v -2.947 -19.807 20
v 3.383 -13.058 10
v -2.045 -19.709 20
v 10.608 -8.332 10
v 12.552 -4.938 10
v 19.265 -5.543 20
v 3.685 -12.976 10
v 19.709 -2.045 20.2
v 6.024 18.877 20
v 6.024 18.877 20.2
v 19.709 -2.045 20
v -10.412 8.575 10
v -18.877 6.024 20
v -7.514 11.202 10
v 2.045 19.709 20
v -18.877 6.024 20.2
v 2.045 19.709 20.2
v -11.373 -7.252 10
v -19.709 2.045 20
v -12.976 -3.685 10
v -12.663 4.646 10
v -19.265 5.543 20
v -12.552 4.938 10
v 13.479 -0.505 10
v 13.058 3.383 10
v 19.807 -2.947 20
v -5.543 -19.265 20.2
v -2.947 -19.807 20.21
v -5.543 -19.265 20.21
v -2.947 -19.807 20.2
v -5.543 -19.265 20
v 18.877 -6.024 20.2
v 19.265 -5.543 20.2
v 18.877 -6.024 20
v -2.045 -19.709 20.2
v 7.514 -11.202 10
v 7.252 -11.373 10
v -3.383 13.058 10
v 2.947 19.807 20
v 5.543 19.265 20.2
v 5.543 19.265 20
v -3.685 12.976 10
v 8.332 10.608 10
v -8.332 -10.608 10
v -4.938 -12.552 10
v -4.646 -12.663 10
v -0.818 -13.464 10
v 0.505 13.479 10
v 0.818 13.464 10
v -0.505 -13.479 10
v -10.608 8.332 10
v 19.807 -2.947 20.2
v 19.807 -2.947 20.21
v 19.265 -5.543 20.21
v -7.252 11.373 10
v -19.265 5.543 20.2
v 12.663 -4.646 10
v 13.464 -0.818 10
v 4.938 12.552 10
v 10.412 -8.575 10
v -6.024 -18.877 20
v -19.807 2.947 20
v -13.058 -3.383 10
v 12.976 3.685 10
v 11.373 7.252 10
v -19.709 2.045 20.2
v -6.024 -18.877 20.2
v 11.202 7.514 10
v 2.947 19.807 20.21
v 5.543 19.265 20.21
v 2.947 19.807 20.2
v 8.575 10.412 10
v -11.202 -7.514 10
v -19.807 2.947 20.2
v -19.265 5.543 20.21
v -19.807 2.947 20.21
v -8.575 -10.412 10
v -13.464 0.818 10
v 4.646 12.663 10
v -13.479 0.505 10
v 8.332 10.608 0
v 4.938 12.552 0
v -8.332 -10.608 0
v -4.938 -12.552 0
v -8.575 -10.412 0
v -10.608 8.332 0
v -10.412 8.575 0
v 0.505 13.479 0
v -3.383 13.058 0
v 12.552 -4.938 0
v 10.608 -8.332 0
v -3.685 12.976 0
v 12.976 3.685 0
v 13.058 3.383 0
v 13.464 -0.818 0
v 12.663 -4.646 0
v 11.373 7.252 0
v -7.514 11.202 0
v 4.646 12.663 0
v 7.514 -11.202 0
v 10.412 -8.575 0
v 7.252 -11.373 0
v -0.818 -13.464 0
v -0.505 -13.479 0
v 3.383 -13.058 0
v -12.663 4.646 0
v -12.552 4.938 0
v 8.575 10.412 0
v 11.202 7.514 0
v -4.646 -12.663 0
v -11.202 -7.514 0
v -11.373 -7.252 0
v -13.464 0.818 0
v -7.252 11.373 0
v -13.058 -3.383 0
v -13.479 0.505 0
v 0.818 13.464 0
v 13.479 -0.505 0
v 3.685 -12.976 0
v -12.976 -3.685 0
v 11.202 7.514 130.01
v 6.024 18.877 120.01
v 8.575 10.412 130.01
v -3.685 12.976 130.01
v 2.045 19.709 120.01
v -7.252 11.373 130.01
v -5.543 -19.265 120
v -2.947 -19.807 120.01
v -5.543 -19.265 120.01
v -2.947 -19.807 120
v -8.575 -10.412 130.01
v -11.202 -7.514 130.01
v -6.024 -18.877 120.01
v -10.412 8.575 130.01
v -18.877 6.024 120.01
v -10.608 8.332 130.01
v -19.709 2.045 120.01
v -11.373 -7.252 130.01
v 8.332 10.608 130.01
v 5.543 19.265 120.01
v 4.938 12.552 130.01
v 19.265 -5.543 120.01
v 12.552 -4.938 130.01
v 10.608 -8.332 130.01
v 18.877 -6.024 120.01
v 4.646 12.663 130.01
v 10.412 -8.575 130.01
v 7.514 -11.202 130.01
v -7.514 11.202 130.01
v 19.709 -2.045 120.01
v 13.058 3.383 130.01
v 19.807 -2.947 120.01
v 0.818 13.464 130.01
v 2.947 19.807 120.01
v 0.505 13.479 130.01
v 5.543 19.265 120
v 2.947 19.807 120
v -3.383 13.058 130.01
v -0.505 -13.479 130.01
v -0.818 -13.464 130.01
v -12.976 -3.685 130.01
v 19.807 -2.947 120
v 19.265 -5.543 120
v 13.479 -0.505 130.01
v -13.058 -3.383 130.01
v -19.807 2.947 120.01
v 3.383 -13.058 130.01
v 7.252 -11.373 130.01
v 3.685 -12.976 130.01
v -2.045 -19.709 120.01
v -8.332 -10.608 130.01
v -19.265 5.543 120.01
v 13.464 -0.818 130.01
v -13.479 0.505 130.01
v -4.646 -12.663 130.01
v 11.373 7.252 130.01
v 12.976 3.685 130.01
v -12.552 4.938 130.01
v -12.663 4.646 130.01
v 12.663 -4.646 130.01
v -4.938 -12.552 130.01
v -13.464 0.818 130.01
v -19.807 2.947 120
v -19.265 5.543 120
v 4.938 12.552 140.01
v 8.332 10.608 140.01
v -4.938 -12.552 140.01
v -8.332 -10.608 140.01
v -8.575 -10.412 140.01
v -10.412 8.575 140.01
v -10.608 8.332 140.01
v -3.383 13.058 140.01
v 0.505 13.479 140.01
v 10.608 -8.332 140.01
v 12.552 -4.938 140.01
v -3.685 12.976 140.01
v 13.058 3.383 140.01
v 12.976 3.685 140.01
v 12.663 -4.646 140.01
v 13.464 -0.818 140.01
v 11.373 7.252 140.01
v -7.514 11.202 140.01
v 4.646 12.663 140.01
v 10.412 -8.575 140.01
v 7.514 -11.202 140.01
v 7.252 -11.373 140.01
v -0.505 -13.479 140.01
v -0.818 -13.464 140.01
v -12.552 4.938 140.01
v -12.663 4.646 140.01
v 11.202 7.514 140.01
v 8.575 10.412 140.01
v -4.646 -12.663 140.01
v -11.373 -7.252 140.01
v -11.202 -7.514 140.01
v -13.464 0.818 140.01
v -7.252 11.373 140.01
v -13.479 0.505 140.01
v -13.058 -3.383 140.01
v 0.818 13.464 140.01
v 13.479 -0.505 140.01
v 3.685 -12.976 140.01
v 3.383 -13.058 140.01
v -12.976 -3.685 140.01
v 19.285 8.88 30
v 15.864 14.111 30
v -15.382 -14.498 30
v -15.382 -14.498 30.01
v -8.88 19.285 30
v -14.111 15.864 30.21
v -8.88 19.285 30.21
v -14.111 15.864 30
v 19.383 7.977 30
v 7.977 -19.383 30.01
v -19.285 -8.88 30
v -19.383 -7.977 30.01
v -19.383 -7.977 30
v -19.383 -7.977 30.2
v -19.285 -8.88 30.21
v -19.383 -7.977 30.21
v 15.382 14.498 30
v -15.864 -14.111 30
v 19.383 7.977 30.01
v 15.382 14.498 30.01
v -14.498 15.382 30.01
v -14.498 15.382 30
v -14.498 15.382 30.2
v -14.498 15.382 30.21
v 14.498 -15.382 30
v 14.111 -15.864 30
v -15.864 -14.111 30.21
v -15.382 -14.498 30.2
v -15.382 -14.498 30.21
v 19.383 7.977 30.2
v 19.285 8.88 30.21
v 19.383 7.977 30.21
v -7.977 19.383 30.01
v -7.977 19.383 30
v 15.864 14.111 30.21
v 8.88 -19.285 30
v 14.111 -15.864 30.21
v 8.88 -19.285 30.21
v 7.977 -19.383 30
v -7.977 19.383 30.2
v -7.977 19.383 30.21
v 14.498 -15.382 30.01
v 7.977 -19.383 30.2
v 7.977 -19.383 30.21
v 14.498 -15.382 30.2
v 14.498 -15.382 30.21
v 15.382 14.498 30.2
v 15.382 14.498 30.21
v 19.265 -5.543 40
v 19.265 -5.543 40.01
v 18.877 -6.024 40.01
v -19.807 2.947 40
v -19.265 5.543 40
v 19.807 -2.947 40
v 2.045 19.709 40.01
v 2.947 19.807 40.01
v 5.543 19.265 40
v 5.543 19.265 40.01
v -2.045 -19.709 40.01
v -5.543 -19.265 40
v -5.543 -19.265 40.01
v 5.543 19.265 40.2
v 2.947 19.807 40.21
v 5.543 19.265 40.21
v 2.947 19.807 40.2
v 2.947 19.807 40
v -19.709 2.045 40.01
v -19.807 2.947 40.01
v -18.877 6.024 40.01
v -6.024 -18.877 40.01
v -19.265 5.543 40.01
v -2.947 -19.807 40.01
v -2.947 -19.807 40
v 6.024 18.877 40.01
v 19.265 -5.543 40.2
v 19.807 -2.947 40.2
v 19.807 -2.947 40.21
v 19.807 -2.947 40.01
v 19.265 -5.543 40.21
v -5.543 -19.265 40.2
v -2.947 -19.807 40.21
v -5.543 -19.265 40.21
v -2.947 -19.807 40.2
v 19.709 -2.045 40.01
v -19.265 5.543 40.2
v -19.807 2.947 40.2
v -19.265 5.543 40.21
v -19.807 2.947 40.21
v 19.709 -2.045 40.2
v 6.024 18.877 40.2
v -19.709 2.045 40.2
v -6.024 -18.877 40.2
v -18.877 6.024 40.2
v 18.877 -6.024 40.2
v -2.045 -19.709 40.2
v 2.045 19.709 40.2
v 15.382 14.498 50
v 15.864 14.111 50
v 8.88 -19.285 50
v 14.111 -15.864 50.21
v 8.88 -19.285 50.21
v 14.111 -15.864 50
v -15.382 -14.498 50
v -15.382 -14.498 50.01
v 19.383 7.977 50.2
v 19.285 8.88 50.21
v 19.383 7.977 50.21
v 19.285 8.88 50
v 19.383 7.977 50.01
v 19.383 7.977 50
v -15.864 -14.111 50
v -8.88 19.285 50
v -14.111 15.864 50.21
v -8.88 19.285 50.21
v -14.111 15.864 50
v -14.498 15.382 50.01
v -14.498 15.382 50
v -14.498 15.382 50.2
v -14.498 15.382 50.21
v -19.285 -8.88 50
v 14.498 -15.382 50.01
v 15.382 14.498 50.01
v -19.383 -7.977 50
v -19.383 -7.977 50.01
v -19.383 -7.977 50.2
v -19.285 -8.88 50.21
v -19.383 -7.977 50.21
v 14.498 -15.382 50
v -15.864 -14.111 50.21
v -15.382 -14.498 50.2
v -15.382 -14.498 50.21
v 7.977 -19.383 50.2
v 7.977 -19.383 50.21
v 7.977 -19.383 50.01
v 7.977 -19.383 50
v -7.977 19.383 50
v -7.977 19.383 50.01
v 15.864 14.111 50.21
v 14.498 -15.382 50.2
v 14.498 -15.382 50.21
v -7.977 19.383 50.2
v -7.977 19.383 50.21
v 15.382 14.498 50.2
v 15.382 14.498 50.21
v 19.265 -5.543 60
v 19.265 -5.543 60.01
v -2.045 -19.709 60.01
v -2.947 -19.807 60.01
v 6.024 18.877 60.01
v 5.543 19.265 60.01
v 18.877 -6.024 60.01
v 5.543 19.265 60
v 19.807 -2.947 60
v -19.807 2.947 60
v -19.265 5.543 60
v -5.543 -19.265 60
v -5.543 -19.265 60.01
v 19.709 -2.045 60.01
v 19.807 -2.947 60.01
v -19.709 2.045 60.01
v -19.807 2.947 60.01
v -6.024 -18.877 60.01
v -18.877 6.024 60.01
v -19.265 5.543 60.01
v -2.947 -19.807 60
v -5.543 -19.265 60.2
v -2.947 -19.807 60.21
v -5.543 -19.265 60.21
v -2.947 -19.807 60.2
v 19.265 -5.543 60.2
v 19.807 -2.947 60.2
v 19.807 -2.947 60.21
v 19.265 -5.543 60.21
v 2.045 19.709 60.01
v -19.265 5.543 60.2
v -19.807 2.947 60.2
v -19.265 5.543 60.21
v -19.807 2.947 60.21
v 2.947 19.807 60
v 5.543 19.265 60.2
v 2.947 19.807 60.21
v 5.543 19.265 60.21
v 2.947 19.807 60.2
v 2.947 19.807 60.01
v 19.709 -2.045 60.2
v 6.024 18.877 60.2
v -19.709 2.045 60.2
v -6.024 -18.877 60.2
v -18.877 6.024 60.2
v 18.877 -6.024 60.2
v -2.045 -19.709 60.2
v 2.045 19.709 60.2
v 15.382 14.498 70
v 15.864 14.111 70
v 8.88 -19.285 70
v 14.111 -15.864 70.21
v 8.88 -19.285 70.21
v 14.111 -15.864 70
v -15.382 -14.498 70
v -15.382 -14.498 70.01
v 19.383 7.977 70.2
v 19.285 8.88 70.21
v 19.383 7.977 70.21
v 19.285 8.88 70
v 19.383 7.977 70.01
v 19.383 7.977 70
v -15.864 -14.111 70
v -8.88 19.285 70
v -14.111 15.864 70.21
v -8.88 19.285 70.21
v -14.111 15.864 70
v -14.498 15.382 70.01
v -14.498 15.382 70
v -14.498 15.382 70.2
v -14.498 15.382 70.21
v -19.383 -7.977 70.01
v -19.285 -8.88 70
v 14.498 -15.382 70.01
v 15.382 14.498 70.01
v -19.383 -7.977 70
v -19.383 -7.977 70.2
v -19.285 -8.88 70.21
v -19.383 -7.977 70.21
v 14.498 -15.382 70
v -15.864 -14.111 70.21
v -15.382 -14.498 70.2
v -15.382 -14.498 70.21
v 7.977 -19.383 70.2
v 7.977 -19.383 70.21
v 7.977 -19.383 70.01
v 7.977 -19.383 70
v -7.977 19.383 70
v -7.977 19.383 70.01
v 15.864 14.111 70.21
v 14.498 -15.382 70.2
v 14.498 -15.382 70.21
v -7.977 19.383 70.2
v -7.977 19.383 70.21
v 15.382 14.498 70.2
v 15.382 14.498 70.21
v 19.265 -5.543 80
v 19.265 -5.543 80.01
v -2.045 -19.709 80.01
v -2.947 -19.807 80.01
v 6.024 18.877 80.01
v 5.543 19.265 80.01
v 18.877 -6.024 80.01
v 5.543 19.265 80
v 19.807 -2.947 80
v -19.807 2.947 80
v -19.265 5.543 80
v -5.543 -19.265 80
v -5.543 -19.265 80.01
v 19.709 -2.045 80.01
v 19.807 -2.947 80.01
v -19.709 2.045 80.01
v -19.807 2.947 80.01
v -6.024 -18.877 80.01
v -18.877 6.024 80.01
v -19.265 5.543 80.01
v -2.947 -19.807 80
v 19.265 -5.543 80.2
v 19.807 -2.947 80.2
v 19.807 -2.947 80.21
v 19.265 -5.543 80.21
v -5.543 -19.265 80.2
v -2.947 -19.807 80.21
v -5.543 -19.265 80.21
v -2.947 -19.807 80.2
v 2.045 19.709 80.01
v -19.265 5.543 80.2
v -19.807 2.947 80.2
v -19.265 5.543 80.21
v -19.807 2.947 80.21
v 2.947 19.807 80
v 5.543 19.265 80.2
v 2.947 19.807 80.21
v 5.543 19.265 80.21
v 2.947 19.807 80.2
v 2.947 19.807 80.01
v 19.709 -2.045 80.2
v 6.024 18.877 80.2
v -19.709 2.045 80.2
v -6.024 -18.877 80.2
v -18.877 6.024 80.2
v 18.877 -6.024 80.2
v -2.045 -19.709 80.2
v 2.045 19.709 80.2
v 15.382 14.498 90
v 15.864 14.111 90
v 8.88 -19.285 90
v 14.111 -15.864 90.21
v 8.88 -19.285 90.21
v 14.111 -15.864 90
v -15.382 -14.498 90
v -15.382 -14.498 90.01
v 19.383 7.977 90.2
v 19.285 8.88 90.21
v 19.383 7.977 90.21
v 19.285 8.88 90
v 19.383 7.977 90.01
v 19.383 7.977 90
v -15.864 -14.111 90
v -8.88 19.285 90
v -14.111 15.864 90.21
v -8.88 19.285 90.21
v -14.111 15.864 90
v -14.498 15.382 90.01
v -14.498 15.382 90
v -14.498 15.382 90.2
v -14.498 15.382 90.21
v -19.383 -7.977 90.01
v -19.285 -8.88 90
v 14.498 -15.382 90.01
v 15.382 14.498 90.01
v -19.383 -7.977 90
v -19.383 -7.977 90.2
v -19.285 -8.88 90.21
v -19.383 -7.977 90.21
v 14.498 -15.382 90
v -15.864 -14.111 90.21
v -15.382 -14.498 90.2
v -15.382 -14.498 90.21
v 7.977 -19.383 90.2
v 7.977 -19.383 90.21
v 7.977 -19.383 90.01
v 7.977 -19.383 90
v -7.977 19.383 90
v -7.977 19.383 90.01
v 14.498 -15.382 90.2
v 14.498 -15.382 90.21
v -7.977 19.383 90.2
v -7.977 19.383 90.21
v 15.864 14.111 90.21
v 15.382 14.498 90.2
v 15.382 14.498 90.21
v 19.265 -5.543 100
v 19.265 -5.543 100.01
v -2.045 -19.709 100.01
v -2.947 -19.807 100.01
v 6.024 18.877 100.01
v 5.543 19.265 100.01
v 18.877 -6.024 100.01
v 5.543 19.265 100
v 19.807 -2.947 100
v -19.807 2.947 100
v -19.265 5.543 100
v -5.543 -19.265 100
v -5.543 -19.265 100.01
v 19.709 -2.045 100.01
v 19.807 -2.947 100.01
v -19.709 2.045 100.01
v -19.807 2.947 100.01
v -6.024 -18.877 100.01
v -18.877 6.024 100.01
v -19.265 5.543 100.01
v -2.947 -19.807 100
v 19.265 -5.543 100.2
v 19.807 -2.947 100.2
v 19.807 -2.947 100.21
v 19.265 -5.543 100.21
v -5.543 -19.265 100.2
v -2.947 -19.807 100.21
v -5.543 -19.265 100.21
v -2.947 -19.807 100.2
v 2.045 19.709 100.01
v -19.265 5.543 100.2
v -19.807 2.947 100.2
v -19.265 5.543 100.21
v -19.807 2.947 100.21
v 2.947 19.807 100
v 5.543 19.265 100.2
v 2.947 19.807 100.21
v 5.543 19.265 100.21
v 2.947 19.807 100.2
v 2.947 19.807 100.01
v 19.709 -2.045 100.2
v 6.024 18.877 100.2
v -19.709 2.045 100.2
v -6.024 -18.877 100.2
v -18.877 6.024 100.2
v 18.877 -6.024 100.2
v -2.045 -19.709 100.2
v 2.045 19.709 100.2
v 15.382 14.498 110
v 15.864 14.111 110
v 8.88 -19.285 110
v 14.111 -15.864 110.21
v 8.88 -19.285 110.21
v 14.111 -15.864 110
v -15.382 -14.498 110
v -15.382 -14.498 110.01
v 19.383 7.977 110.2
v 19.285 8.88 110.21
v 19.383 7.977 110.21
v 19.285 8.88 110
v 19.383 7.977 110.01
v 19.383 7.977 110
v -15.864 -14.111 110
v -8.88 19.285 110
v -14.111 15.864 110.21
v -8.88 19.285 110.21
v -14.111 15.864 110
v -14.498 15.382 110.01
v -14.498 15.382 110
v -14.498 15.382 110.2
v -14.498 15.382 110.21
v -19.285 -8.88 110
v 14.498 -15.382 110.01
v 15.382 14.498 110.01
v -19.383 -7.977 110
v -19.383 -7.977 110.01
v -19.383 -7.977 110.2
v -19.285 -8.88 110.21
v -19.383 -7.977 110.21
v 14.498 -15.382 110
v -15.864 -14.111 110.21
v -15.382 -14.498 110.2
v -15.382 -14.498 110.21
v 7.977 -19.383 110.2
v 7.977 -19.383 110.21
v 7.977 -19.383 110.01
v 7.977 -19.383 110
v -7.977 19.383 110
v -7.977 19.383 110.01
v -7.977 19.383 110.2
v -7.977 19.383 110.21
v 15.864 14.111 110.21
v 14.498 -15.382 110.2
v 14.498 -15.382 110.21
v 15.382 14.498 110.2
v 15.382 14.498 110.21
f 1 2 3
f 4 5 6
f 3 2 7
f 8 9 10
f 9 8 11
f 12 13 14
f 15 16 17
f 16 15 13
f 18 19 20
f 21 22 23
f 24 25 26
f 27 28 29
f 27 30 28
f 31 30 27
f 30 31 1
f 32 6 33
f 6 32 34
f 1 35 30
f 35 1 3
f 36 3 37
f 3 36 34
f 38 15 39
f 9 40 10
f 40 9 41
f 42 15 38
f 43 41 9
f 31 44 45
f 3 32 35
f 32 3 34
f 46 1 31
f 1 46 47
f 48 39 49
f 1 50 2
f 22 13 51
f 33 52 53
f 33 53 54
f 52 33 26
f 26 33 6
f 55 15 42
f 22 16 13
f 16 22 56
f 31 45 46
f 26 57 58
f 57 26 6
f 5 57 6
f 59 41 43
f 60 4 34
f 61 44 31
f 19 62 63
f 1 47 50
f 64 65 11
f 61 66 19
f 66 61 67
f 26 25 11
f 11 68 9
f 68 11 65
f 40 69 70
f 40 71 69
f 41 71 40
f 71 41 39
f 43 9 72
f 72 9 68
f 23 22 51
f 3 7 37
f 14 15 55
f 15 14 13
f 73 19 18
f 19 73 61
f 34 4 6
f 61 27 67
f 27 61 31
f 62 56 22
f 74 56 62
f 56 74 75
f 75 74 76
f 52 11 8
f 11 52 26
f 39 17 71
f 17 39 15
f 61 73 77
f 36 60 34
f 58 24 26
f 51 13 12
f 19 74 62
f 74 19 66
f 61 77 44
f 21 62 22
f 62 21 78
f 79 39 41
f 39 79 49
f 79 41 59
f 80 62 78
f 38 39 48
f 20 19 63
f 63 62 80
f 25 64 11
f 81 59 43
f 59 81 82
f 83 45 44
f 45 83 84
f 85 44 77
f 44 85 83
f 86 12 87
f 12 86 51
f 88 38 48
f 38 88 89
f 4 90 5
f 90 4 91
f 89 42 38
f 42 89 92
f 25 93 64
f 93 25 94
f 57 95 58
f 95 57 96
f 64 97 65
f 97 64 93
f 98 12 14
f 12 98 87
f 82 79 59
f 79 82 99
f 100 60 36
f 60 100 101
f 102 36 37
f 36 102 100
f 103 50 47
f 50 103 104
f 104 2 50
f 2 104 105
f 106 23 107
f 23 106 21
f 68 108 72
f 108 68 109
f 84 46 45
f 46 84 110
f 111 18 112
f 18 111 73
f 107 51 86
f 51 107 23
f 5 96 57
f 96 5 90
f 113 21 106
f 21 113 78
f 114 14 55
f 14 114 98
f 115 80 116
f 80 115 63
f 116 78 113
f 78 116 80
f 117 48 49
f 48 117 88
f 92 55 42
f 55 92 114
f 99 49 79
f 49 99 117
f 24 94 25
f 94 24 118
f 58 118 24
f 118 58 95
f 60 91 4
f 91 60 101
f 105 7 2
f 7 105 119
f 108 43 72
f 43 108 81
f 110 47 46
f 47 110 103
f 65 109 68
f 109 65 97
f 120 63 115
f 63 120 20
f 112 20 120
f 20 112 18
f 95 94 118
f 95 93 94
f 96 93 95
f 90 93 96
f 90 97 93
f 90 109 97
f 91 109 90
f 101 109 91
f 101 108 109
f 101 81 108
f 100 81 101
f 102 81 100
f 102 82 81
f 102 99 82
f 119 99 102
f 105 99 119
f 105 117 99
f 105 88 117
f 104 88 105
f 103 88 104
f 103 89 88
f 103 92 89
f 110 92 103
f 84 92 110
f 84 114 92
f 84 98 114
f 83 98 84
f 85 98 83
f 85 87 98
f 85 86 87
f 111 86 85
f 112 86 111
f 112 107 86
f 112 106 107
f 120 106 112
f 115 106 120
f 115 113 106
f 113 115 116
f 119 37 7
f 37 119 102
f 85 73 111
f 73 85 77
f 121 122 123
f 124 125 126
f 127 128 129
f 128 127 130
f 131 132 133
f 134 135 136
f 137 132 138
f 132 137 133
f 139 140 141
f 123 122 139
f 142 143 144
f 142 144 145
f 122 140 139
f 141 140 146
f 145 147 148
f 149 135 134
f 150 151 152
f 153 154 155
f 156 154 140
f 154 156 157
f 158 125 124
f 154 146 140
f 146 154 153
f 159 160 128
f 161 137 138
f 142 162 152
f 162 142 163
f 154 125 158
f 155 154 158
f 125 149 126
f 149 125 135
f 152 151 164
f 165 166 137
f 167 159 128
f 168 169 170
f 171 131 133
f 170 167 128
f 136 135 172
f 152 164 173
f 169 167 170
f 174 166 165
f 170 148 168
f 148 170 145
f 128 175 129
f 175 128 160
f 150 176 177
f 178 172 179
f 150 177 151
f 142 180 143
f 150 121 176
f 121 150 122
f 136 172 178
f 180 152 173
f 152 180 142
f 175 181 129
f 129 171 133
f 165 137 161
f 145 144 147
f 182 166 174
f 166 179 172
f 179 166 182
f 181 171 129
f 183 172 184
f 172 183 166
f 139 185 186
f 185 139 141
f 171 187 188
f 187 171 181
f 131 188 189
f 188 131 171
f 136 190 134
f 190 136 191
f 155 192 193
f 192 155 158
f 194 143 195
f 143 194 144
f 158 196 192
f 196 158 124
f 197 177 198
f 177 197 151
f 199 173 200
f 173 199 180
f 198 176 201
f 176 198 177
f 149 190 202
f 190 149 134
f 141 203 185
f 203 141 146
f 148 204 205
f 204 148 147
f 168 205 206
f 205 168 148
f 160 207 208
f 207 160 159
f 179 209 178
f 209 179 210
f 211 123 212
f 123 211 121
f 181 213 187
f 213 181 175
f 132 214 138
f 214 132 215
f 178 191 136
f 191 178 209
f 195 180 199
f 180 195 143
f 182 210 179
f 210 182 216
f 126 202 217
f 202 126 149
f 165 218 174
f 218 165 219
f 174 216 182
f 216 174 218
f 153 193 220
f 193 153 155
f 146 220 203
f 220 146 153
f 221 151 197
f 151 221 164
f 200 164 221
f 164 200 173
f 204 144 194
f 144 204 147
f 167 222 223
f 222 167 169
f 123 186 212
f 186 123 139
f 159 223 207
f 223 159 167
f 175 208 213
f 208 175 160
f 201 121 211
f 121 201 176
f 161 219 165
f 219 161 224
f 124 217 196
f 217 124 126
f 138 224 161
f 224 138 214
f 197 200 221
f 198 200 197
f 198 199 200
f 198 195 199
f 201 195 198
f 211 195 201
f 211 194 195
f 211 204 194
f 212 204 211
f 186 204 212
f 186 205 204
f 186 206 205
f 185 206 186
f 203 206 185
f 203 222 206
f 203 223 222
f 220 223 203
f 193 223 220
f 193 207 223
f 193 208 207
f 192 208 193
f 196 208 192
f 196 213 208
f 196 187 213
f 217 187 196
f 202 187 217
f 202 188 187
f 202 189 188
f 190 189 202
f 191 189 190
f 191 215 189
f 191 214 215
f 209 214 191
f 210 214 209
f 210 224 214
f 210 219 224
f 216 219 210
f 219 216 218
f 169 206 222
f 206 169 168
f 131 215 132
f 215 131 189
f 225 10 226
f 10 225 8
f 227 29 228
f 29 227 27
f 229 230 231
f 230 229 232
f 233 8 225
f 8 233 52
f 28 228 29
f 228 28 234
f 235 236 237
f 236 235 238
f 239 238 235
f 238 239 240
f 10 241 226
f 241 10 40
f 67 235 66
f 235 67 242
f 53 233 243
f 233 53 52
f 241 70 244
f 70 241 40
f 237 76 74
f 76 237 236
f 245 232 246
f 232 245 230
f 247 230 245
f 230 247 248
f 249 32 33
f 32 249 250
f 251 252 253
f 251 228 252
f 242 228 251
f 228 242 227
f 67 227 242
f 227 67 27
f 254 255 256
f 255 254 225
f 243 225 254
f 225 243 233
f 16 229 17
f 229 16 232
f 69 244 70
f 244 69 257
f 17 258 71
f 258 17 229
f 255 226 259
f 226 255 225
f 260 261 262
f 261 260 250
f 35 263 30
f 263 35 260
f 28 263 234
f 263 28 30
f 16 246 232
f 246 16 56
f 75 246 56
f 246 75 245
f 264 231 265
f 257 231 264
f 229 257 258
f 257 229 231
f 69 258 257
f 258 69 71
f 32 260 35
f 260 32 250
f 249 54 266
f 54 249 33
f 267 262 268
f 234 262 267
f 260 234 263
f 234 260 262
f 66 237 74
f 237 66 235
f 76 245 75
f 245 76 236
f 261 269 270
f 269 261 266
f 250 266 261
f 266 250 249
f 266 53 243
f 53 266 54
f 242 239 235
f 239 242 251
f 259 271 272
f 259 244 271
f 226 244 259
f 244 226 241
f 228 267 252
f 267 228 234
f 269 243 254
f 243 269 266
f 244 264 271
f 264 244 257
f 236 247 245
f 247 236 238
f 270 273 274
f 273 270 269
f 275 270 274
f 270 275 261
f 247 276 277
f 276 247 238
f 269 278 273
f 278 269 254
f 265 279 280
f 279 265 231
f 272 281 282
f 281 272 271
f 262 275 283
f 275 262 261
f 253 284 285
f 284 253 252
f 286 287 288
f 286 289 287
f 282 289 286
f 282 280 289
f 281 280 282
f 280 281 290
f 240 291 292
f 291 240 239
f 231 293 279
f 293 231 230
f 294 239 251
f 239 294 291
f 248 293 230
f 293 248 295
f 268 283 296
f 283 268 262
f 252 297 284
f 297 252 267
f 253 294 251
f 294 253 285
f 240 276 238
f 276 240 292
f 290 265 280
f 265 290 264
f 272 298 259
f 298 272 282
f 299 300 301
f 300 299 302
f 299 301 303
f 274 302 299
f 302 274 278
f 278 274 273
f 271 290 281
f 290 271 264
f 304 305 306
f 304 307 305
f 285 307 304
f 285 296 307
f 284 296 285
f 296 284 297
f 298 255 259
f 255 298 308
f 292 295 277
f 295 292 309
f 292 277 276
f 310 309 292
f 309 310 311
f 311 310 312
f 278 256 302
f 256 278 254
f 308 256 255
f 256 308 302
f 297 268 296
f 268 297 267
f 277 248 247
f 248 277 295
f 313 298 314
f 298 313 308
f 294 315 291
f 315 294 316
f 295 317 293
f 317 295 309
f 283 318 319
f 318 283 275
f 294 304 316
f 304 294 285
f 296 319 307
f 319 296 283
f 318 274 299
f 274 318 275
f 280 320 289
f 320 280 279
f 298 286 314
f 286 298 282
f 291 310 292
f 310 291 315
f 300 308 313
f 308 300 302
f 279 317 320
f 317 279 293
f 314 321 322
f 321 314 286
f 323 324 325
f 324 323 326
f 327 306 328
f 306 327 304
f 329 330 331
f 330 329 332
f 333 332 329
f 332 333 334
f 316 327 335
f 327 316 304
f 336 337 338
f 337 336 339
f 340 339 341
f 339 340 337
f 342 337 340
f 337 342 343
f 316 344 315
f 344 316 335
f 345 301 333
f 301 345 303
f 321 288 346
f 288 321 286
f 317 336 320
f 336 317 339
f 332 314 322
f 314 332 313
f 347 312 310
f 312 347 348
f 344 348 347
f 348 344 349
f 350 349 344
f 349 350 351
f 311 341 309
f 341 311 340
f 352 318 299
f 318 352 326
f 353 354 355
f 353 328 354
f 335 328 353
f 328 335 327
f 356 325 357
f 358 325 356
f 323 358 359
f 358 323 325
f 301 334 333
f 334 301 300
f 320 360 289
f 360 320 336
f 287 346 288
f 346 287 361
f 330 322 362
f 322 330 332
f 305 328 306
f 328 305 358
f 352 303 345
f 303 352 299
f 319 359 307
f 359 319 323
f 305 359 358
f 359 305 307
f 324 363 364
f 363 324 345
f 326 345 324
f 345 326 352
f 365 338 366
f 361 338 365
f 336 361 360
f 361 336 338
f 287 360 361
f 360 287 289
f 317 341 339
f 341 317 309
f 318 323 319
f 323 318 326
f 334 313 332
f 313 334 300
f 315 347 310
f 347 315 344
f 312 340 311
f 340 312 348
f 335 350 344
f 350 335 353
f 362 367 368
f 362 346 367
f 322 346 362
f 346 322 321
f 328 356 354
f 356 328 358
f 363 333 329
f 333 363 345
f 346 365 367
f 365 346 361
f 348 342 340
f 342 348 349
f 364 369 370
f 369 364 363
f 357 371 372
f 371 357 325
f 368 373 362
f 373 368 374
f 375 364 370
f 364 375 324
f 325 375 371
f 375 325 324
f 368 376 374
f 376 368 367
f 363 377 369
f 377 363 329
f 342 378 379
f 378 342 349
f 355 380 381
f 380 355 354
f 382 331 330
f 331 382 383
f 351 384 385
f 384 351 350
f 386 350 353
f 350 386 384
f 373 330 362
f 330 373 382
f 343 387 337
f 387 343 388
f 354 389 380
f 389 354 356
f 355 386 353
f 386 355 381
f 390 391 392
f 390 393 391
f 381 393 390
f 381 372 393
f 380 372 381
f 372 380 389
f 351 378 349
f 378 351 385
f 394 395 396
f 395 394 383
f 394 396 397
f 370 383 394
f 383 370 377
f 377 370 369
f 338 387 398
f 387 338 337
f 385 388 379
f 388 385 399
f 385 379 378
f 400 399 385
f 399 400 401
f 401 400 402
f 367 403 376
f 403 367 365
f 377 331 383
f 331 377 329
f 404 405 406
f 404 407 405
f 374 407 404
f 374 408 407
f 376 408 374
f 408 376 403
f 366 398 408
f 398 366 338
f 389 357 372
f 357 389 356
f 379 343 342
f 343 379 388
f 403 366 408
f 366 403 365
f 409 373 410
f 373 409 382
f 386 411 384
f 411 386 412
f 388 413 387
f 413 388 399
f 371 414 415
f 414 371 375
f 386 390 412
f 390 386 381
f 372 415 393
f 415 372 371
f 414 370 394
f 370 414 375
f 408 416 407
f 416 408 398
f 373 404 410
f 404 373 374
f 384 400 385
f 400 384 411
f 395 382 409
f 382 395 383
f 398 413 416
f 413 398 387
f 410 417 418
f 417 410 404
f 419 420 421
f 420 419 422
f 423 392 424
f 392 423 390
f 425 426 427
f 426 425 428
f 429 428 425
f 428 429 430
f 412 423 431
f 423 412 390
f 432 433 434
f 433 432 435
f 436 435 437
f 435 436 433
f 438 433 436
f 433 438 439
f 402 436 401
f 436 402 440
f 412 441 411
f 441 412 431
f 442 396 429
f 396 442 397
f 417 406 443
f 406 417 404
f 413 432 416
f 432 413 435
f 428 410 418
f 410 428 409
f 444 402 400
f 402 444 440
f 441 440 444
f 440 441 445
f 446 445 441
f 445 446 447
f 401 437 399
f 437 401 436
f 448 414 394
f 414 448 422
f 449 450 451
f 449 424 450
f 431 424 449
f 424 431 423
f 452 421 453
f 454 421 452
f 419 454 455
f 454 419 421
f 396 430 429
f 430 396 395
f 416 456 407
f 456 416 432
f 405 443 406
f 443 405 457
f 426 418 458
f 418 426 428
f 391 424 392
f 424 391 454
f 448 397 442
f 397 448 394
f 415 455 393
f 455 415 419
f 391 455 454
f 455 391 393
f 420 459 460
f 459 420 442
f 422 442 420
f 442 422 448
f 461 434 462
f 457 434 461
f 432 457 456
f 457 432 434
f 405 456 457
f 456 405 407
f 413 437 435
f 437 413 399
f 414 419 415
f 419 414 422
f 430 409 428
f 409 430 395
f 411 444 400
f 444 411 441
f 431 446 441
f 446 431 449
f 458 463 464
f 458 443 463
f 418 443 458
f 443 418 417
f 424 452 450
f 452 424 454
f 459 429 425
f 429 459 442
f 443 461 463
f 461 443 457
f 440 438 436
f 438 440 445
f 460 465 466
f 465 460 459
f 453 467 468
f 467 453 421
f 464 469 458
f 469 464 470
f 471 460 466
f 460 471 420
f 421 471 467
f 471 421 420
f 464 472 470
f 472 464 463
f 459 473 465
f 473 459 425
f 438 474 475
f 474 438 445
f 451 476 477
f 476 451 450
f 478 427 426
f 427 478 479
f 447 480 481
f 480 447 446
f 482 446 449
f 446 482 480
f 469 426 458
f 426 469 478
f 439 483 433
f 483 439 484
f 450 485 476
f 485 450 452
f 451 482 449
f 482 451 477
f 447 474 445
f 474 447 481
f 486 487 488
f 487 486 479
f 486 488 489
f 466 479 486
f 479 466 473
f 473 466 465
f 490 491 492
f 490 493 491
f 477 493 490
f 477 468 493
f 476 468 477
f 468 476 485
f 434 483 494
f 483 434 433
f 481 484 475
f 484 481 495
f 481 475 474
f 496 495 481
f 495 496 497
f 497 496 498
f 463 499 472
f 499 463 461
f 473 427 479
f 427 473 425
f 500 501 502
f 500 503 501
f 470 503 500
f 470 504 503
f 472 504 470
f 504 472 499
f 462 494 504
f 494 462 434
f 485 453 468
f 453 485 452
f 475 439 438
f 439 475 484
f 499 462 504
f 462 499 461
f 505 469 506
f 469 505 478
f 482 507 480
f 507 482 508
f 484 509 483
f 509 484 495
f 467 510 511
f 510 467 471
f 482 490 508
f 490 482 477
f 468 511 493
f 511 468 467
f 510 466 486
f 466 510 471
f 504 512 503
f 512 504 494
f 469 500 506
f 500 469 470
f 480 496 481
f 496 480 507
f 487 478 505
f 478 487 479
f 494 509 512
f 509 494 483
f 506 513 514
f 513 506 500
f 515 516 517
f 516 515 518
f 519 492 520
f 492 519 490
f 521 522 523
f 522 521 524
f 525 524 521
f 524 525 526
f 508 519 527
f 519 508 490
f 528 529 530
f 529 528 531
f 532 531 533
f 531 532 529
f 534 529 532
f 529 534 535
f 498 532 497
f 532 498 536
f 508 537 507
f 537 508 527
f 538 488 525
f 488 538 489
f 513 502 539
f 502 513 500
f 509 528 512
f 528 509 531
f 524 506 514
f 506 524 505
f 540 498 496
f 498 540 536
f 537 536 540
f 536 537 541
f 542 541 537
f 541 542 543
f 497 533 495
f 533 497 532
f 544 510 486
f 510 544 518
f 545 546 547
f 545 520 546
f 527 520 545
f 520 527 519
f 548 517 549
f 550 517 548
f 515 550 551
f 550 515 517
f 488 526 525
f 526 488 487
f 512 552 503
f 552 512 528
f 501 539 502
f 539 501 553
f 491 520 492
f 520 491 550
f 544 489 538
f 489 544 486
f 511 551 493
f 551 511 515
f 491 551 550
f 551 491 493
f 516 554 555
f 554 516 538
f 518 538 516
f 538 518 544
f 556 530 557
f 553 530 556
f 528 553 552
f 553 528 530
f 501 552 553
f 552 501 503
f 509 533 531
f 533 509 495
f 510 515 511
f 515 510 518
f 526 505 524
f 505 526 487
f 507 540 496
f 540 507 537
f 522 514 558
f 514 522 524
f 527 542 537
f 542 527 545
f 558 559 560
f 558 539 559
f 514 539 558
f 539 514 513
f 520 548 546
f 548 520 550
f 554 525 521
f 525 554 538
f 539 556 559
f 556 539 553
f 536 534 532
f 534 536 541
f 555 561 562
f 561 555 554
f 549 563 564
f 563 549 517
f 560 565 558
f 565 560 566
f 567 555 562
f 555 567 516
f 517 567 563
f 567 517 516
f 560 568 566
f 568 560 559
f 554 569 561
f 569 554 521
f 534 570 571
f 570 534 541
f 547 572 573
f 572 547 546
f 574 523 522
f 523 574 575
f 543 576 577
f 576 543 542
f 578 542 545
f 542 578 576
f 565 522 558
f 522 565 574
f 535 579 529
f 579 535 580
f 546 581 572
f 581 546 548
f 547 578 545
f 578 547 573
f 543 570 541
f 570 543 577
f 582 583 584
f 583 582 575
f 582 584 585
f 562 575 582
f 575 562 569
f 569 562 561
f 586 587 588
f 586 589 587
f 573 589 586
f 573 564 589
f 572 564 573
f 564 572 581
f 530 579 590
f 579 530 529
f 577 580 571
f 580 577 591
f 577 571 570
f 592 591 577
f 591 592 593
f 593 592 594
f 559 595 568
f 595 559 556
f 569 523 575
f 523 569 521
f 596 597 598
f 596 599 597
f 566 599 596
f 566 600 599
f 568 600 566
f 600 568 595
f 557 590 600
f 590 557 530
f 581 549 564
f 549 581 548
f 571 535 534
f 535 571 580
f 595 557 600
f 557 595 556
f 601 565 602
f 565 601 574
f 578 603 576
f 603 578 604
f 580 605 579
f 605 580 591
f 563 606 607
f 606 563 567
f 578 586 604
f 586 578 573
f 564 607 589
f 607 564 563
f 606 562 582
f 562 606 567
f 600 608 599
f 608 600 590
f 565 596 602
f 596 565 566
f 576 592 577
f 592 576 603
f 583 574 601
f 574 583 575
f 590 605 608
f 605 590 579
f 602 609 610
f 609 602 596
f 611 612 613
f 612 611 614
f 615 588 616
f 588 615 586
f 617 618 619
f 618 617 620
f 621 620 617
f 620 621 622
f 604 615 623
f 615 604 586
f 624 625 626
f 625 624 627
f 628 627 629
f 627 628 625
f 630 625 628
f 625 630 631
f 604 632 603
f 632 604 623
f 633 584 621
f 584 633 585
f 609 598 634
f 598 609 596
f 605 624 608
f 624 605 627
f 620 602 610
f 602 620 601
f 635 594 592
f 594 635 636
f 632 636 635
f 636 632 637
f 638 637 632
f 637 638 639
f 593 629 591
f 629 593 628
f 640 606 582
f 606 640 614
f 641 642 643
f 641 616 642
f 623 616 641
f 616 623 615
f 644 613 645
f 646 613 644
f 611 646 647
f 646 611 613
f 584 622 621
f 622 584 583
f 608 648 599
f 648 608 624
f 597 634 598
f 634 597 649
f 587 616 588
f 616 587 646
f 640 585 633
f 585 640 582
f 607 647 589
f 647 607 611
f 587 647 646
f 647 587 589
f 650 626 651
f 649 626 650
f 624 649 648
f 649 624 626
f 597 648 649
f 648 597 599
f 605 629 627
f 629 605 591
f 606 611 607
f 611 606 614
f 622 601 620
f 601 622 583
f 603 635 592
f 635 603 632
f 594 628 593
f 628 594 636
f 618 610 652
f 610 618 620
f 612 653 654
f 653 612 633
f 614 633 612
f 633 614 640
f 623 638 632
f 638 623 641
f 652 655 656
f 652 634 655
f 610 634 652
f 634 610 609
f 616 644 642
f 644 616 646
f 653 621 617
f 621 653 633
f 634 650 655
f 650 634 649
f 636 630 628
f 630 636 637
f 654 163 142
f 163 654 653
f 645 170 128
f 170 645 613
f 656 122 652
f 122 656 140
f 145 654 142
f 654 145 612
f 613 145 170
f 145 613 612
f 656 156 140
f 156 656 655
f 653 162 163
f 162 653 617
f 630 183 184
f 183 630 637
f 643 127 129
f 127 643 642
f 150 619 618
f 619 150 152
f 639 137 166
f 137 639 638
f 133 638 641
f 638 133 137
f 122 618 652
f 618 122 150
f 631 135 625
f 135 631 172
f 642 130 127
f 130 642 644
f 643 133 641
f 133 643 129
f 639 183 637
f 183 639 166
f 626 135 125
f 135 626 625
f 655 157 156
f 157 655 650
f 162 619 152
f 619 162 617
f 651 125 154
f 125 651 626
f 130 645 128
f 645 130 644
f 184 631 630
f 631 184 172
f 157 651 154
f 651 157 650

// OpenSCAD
x = 25;
y = 25;
approx_z = 100;
steps = 10;
step = round(approx_z  / steps);
z=step*steps;
step2 = floor(step * 2);
ext = 1.5;
radi = 1;
verticalsegment = 0.2;
sleeve = 20;
sleeve_ext = 0;
sleeveext = sleeve*sleeve_ext;
sleeveFN = 20;

hx=x/2;
hy=y/2;
rotate([0,0,rnd(360)]){
sleeves();
body();
}
echo (ext);
module sleeves() {
  hull() {
    translate([0, 0, verticalsegment+  sleeve]) plane(x, y, 0);
    translate([0, 0,   sleeve]) plane(x, y, 0);
    translate([0, 0, sleeve- min(step,sleeve*0.5)]) sleeve(x, y);
  }
  hull() {
    translate([0, 0, sleeve- min(step,sleeve*0.5)]) sleeve(x, y);
    translate([0, 0, 0]) sleeve(x, y);
  }

  hull() {
    translate([0, 0, sleeve]) plane(x, y, z);
    translate([0, 0, z + sleeve + min(step,sleeve*0.5)]) sleeve(x, y);
  }
  hull() {
    translate([0, 0, z + sleeve + sleeve]) sleeve(x, y);
    translate([0, 0, z + sleeve + min(step,sleeve*0.5)]) sleeve(x, y);
  }
}
module body() {
  for (i = [0: step: z - step]) {
    hull() {
      translate([0, 0, verticalsegment + sleeve]) plane(x, y, i);
      translate([0, 0, sleeve]) plane(x, y, i);
    }
    hull() {
      translate([0, 0, verticalsegment + sleeve]) plane(x, y, i);
      translate([0, 0, sleeve]) plane(x, y, i + step);
    }
  }
}
module plane(x, y, z) {
  translate([0, 0, z]) linear_extrude(0.01) offset(r = radi, $fn = 10){
 square([x -hx * ext + ext*((z +step ) % step2) * ext, y + ((z  ) % step2) * ext], center = true);
 square([x + ((z ) % step2) * ext, y   -hy*ext+ ext*((z +step ) % step2) * ext ], center = true);
}
}
module sleeve(x, y) {
  translate([0, 0, 0]) linear_extrude(0.01) offset(r = radi, $fn = 10) scale([x + sleeveext * 2, y + sleeveext * 2])circle(0.5,$fn=sleeveFN);}

function rnd(a=0,b=1)=(rands(min(a,b),max(a,b),1)[0]);
